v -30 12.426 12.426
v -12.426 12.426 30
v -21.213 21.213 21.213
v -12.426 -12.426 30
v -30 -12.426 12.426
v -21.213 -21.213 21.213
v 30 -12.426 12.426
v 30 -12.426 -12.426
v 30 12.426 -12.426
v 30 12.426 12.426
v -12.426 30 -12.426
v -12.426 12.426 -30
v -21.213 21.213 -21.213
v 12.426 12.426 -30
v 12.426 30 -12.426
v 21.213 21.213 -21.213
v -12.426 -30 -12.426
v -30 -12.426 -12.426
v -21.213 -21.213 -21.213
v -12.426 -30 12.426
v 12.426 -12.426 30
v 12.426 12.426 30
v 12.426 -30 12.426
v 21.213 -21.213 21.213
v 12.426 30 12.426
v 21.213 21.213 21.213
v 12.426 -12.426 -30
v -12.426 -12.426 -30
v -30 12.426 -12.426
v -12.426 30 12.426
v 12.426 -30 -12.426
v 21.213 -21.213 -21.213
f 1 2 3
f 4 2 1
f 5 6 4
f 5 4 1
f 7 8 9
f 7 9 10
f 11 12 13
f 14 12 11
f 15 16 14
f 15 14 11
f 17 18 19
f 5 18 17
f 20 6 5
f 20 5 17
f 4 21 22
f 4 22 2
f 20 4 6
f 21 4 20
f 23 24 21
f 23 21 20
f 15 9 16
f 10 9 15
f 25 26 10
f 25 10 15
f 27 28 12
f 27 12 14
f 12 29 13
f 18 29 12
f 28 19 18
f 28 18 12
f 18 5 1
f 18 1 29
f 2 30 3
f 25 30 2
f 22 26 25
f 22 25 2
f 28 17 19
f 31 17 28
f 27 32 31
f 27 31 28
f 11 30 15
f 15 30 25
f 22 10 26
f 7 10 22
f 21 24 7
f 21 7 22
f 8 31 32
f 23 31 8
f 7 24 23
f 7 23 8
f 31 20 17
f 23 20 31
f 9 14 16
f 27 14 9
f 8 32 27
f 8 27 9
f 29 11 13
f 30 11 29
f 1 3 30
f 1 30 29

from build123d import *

# Parameters (mm, degrees)
F3_DEPTH = 30
F4_DEPTH = 30
F5_DEPTH = 30


with BuildPart() as f3:
    # F0 (on Front) → F3 (new body, symmetric)
    with BuildSketch(Plane.XZ):
        Polygon((-30, 12.426407), (-30, -12.426407), (-12.426407, -30), (12.426407, -30), (30, -12.426407), (30, 12.426407), (12.426407, 30), (-12.426407, 30), align=None)
    extrude(amount=F3_DEPTH, both=True)

    # F1 (on Top) → F4 (intersect, symmetric)
    with BuildSketch(Plane.XY):
        Polygon((30, -12.426407), (30, 12.426407), (12.426407, 30), (-12.426407, 30), (-30, 12.426407), (-30, -12.426407), (-12.426407, -30), (12.426407, -30), align=None)
    extrude(amount=F4_DEPTH, both=True, mode=Mode.INTERSECT)

    # F2 (on Right) → F5 (intersect, symmetric)
    with BuildSketch(Plane.YZ):
        Polygon((12.426407, 30), (-12.426407, 30), (-30, 12.426407), (-30, -12.426407), (-12.426407, -30), (12.426407, -30), (30, -12.426407), (30, 12.426407), align=None)
    extrude(amount=F5_DEPTH, both=True, mode=Mode.INTERSECT)


solid = f3.part
